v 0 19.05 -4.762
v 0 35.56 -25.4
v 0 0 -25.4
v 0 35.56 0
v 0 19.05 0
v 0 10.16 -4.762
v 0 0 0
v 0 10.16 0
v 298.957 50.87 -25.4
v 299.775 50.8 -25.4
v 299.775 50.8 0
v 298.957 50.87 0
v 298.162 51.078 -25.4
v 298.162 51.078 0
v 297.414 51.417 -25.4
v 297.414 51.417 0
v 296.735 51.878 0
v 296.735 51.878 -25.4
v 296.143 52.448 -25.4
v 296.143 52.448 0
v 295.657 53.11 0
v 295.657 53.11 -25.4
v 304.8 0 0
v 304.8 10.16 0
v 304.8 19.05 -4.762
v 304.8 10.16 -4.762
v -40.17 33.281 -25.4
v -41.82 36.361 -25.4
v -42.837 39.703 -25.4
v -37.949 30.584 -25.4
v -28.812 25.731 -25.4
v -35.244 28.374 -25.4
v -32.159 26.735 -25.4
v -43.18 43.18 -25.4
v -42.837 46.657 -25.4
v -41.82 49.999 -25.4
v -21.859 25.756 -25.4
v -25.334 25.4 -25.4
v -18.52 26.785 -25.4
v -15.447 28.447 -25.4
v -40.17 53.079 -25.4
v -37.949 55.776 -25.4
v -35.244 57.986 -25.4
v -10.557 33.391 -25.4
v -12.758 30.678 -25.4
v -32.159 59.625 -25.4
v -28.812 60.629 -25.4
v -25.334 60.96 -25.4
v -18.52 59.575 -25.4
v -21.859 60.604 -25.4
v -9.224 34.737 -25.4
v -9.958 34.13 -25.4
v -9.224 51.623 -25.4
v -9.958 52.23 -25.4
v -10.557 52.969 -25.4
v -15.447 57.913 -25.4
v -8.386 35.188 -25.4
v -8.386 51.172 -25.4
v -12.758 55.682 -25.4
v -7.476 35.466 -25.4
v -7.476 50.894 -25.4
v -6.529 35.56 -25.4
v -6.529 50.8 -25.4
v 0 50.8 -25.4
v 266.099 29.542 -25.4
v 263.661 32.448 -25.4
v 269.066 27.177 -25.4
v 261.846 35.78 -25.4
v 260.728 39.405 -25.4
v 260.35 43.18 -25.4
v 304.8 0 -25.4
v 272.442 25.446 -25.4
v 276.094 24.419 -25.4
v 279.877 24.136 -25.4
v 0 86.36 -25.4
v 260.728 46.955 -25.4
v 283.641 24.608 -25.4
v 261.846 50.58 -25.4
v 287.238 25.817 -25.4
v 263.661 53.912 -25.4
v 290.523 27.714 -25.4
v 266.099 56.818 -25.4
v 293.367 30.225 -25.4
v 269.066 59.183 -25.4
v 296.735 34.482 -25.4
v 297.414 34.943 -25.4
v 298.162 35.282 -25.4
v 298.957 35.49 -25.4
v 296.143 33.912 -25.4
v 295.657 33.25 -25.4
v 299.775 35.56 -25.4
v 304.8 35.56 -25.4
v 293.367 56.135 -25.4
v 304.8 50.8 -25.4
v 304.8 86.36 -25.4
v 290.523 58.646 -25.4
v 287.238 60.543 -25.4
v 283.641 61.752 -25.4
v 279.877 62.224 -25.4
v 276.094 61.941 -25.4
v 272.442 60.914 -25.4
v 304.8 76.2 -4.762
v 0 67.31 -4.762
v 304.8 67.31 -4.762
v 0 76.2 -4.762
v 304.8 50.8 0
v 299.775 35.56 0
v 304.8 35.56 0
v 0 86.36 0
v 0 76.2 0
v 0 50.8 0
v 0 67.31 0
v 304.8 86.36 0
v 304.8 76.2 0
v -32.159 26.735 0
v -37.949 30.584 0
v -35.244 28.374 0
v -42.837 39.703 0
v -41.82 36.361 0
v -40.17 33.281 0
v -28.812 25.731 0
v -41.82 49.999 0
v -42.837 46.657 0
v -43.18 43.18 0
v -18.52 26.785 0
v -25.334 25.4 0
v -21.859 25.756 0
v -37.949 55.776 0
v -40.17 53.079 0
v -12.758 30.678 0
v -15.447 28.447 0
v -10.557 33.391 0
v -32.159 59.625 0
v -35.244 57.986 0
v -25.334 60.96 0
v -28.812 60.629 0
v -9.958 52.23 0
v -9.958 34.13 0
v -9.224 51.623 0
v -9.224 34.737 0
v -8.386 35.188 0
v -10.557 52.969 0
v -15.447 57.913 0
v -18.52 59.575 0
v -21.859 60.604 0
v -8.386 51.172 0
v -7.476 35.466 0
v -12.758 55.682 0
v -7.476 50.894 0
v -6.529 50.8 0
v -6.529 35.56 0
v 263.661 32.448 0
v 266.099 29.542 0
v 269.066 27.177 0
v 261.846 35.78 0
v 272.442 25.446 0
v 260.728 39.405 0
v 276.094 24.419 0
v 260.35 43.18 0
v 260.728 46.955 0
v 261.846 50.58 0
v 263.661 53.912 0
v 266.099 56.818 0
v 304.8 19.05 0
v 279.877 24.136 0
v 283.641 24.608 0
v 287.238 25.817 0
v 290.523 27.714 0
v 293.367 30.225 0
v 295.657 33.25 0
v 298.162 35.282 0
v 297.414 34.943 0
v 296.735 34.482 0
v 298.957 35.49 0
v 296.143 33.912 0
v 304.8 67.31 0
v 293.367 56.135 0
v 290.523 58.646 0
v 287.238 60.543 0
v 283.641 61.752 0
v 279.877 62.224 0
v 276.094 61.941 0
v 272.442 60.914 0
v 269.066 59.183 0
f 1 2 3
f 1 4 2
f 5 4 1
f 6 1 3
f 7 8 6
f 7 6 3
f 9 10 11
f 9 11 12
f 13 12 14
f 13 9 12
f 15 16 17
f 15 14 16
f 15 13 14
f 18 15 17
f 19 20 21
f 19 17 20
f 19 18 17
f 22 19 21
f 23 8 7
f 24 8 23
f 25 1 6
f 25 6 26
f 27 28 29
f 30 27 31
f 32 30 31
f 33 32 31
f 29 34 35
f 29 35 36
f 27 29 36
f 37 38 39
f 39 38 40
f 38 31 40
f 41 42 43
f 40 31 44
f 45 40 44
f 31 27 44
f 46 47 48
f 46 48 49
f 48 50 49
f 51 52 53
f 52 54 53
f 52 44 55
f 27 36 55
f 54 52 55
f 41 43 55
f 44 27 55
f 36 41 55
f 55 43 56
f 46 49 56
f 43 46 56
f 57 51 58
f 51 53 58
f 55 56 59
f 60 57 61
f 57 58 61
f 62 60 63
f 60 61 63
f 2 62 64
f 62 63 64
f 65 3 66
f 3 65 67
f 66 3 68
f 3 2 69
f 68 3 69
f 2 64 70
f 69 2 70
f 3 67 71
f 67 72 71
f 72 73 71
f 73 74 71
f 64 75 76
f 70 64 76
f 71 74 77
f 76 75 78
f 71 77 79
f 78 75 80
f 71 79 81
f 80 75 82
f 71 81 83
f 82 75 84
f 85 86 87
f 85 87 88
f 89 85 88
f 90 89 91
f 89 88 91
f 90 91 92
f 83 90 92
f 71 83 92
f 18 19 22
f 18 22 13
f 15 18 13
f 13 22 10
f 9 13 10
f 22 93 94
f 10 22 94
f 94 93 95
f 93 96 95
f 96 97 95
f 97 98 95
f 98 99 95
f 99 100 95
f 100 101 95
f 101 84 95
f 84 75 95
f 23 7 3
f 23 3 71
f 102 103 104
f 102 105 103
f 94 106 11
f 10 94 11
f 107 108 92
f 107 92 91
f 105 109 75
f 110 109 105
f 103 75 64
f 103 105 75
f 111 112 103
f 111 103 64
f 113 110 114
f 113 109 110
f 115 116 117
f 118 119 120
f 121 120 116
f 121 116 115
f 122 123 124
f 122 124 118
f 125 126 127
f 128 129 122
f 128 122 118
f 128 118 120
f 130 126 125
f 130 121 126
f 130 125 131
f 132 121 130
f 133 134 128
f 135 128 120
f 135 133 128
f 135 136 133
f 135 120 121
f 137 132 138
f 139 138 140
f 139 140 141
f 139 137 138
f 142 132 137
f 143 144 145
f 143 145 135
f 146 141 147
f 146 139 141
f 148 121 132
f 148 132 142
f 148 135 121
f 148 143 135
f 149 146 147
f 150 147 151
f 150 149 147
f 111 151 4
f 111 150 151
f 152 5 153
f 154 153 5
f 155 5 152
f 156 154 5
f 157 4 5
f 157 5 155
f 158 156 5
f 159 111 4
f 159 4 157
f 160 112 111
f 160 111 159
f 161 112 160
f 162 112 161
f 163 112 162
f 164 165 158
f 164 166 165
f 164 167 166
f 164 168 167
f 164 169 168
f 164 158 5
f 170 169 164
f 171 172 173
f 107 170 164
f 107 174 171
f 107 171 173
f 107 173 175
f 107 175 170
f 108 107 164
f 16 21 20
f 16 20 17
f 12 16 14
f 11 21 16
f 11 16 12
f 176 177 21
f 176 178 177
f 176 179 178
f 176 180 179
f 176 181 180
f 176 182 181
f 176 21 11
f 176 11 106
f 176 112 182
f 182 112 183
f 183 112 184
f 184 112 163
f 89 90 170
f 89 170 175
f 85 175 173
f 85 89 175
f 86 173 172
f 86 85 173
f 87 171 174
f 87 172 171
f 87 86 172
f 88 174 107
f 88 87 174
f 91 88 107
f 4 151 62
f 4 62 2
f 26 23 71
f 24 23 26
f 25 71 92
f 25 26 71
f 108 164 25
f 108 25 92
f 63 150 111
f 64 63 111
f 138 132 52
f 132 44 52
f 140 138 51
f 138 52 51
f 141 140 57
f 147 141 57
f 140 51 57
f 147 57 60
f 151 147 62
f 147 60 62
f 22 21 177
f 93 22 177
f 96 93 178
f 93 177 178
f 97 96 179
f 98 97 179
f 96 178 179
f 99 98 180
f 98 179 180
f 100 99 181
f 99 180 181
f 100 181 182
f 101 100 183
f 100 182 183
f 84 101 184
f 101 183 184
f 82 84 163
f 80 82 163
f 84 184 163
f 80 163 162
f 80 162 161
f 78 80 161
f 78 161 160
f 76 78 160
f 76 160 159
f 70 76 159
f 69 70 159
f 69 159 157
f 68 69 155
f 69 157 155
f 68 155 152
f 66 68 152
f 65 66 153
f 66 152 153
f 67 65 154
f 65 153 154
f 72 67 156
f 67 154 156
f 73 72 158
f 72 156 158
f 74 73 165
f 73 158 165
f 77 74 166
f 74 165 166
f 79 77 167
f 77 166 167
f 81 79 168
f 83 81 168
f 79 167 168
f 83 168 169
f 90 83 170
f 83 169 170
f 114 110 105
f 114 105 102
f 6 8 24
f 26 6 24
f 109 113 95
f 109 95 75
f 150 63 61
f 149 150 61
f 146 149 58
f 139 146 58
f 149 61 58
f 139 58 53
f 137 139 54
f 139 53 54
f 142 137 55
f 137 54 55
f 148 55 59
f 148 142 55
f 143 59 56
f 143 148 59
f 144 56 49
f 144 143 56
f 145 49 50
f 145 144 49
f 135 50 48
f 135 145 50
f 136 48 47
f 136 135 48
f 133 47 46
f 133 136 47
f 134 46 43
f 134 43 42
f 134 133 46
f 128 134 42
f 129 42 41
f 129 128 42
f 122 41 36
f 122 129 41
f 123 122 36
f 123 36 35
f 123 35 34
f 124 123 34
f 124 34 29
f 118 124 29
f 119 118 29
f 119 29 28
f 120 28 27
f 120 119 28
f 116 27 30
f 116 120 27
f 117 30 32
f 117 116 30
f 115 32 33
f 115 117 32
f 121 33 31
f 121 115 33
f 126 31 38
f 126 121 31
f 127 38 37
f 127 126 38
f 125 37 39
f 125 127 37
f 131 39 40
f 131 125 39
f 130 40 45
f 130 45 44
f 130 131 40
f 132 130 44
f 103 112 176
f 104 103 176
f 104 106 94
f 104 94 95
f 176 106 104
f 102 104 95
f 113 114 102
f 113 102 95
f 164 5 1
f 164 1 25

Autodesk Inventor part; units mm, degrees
ref_plane "YZ Plane" through (0, 0, 0) normal (1, 0, 0) x (0, 1, 0)
ref_plane "XZ Plane" through (0, 0, 0) normal (0, 1, 0) x (-1, 0, 0)
ref_plane "XY Plane" through (0, 0, 0) normal (0, 0, 1) x (1, 0, 0)
sketch "StraightTrack1" plane through (0, 0, 0) normal (0, 0, 1) x (1, 0, 0)
  line L0 (0, 0) -> (304.8, 0)
  line L1 (304.8, 0) -> (304.8, 86.36)
  line L2 (304.8, 86.36) -> (0, 86.36)
  line L3 (0, 86.36) -> (0, 0)
  line L4 (0, 43.18) -> (304.8, 43.18) construction
  line L5 (0, 43.18) -> (-127, 43.18) construction
  line L6 (304.8, 43.18) -> (431.8, 43.18) construction
  line L7 (-35.3212, 50.8) -> (355.1298, 50.8) construction
  line L8 (-9.3356, 35.56) -> (354.8509, 35.56) construction
  circle A0 centre (-25.4, 43.18) radius 17.78
  line L9 (-9.3356, 50.8) -> (0, 50.8)
  line L10 (-9.3356, 35.56) -> (0, 35.56)
  line L11 (-16.6442, 10.16) -> (350.0615, 10.16) construction
  line L12 (-16.6442, 76.2) -> (344.385, 76.2) construction
  line L13 (0, 10.16) -> (304.8, 10.16)
  line L14 (0, 76.2) -> (304.8, 76.2)
  line L15 (0, 67.31) -> (304.8, 67.31)
  line L16 (0, 19.05) -> (304.8, 19.05)
  line L17 (304.8, 50.8) -> (296.8596, 50.8)
  line L18 (304.8, 35.56) -> (296.8596, 35.56)
  circle A1 centre (279.4, 43.18) radius 19.05
  dimension "d0" = 304.8
  dimension "d1" = 86.36
  dimension "d2" = 127
  dimension "d3" = 127
  dimension "d5" = 35.56
  dimension "d6" = 15.24
  dimension "d7" = 35.56
  dimension "d8" = 25.4
  dimension "d9" = 9.3356
  dimension "d10" = 10.16
  dimension "d11" = 10.16
  dimension "d12" = 8.89
  dimension "d13" = 8.89
  dimension "d22" = 38.1
  dimension "d23" = 279.4
extrude "Extrusion1" add sketch "StraightTrack1" against normal blind 25.4 contours L3 L13 L1 L0 | L3 L16 L1 L13 | L3 L15 L1 L17 A1 L18 L16 | L10 A0 L9 L3 | A0 | L3 L14 L1 L15 | L3 L2 L1 L14
extrude "Extrusion3" cut sketch "StraightTrack1" against normal blind 4.7625 contours L3 L16 L1 L13 | L3 L14 L1 L15
fillet "Fillet1" radius 4.826 1 edges at (296.8596, 35.56, -12.7)
fillet "Fillet2" radius 4.826 1 edges at (296.8596, 50.8, -12.7)
fillet "Fillet3" radius 4.826 1 edges at (-9.3356, 50.8, -12.7)
fillet "Fillet4" radius 4.826 1 edges at (-9.3356, 35.56, -12.7)
properties part number "Sun_StraightTrack"
